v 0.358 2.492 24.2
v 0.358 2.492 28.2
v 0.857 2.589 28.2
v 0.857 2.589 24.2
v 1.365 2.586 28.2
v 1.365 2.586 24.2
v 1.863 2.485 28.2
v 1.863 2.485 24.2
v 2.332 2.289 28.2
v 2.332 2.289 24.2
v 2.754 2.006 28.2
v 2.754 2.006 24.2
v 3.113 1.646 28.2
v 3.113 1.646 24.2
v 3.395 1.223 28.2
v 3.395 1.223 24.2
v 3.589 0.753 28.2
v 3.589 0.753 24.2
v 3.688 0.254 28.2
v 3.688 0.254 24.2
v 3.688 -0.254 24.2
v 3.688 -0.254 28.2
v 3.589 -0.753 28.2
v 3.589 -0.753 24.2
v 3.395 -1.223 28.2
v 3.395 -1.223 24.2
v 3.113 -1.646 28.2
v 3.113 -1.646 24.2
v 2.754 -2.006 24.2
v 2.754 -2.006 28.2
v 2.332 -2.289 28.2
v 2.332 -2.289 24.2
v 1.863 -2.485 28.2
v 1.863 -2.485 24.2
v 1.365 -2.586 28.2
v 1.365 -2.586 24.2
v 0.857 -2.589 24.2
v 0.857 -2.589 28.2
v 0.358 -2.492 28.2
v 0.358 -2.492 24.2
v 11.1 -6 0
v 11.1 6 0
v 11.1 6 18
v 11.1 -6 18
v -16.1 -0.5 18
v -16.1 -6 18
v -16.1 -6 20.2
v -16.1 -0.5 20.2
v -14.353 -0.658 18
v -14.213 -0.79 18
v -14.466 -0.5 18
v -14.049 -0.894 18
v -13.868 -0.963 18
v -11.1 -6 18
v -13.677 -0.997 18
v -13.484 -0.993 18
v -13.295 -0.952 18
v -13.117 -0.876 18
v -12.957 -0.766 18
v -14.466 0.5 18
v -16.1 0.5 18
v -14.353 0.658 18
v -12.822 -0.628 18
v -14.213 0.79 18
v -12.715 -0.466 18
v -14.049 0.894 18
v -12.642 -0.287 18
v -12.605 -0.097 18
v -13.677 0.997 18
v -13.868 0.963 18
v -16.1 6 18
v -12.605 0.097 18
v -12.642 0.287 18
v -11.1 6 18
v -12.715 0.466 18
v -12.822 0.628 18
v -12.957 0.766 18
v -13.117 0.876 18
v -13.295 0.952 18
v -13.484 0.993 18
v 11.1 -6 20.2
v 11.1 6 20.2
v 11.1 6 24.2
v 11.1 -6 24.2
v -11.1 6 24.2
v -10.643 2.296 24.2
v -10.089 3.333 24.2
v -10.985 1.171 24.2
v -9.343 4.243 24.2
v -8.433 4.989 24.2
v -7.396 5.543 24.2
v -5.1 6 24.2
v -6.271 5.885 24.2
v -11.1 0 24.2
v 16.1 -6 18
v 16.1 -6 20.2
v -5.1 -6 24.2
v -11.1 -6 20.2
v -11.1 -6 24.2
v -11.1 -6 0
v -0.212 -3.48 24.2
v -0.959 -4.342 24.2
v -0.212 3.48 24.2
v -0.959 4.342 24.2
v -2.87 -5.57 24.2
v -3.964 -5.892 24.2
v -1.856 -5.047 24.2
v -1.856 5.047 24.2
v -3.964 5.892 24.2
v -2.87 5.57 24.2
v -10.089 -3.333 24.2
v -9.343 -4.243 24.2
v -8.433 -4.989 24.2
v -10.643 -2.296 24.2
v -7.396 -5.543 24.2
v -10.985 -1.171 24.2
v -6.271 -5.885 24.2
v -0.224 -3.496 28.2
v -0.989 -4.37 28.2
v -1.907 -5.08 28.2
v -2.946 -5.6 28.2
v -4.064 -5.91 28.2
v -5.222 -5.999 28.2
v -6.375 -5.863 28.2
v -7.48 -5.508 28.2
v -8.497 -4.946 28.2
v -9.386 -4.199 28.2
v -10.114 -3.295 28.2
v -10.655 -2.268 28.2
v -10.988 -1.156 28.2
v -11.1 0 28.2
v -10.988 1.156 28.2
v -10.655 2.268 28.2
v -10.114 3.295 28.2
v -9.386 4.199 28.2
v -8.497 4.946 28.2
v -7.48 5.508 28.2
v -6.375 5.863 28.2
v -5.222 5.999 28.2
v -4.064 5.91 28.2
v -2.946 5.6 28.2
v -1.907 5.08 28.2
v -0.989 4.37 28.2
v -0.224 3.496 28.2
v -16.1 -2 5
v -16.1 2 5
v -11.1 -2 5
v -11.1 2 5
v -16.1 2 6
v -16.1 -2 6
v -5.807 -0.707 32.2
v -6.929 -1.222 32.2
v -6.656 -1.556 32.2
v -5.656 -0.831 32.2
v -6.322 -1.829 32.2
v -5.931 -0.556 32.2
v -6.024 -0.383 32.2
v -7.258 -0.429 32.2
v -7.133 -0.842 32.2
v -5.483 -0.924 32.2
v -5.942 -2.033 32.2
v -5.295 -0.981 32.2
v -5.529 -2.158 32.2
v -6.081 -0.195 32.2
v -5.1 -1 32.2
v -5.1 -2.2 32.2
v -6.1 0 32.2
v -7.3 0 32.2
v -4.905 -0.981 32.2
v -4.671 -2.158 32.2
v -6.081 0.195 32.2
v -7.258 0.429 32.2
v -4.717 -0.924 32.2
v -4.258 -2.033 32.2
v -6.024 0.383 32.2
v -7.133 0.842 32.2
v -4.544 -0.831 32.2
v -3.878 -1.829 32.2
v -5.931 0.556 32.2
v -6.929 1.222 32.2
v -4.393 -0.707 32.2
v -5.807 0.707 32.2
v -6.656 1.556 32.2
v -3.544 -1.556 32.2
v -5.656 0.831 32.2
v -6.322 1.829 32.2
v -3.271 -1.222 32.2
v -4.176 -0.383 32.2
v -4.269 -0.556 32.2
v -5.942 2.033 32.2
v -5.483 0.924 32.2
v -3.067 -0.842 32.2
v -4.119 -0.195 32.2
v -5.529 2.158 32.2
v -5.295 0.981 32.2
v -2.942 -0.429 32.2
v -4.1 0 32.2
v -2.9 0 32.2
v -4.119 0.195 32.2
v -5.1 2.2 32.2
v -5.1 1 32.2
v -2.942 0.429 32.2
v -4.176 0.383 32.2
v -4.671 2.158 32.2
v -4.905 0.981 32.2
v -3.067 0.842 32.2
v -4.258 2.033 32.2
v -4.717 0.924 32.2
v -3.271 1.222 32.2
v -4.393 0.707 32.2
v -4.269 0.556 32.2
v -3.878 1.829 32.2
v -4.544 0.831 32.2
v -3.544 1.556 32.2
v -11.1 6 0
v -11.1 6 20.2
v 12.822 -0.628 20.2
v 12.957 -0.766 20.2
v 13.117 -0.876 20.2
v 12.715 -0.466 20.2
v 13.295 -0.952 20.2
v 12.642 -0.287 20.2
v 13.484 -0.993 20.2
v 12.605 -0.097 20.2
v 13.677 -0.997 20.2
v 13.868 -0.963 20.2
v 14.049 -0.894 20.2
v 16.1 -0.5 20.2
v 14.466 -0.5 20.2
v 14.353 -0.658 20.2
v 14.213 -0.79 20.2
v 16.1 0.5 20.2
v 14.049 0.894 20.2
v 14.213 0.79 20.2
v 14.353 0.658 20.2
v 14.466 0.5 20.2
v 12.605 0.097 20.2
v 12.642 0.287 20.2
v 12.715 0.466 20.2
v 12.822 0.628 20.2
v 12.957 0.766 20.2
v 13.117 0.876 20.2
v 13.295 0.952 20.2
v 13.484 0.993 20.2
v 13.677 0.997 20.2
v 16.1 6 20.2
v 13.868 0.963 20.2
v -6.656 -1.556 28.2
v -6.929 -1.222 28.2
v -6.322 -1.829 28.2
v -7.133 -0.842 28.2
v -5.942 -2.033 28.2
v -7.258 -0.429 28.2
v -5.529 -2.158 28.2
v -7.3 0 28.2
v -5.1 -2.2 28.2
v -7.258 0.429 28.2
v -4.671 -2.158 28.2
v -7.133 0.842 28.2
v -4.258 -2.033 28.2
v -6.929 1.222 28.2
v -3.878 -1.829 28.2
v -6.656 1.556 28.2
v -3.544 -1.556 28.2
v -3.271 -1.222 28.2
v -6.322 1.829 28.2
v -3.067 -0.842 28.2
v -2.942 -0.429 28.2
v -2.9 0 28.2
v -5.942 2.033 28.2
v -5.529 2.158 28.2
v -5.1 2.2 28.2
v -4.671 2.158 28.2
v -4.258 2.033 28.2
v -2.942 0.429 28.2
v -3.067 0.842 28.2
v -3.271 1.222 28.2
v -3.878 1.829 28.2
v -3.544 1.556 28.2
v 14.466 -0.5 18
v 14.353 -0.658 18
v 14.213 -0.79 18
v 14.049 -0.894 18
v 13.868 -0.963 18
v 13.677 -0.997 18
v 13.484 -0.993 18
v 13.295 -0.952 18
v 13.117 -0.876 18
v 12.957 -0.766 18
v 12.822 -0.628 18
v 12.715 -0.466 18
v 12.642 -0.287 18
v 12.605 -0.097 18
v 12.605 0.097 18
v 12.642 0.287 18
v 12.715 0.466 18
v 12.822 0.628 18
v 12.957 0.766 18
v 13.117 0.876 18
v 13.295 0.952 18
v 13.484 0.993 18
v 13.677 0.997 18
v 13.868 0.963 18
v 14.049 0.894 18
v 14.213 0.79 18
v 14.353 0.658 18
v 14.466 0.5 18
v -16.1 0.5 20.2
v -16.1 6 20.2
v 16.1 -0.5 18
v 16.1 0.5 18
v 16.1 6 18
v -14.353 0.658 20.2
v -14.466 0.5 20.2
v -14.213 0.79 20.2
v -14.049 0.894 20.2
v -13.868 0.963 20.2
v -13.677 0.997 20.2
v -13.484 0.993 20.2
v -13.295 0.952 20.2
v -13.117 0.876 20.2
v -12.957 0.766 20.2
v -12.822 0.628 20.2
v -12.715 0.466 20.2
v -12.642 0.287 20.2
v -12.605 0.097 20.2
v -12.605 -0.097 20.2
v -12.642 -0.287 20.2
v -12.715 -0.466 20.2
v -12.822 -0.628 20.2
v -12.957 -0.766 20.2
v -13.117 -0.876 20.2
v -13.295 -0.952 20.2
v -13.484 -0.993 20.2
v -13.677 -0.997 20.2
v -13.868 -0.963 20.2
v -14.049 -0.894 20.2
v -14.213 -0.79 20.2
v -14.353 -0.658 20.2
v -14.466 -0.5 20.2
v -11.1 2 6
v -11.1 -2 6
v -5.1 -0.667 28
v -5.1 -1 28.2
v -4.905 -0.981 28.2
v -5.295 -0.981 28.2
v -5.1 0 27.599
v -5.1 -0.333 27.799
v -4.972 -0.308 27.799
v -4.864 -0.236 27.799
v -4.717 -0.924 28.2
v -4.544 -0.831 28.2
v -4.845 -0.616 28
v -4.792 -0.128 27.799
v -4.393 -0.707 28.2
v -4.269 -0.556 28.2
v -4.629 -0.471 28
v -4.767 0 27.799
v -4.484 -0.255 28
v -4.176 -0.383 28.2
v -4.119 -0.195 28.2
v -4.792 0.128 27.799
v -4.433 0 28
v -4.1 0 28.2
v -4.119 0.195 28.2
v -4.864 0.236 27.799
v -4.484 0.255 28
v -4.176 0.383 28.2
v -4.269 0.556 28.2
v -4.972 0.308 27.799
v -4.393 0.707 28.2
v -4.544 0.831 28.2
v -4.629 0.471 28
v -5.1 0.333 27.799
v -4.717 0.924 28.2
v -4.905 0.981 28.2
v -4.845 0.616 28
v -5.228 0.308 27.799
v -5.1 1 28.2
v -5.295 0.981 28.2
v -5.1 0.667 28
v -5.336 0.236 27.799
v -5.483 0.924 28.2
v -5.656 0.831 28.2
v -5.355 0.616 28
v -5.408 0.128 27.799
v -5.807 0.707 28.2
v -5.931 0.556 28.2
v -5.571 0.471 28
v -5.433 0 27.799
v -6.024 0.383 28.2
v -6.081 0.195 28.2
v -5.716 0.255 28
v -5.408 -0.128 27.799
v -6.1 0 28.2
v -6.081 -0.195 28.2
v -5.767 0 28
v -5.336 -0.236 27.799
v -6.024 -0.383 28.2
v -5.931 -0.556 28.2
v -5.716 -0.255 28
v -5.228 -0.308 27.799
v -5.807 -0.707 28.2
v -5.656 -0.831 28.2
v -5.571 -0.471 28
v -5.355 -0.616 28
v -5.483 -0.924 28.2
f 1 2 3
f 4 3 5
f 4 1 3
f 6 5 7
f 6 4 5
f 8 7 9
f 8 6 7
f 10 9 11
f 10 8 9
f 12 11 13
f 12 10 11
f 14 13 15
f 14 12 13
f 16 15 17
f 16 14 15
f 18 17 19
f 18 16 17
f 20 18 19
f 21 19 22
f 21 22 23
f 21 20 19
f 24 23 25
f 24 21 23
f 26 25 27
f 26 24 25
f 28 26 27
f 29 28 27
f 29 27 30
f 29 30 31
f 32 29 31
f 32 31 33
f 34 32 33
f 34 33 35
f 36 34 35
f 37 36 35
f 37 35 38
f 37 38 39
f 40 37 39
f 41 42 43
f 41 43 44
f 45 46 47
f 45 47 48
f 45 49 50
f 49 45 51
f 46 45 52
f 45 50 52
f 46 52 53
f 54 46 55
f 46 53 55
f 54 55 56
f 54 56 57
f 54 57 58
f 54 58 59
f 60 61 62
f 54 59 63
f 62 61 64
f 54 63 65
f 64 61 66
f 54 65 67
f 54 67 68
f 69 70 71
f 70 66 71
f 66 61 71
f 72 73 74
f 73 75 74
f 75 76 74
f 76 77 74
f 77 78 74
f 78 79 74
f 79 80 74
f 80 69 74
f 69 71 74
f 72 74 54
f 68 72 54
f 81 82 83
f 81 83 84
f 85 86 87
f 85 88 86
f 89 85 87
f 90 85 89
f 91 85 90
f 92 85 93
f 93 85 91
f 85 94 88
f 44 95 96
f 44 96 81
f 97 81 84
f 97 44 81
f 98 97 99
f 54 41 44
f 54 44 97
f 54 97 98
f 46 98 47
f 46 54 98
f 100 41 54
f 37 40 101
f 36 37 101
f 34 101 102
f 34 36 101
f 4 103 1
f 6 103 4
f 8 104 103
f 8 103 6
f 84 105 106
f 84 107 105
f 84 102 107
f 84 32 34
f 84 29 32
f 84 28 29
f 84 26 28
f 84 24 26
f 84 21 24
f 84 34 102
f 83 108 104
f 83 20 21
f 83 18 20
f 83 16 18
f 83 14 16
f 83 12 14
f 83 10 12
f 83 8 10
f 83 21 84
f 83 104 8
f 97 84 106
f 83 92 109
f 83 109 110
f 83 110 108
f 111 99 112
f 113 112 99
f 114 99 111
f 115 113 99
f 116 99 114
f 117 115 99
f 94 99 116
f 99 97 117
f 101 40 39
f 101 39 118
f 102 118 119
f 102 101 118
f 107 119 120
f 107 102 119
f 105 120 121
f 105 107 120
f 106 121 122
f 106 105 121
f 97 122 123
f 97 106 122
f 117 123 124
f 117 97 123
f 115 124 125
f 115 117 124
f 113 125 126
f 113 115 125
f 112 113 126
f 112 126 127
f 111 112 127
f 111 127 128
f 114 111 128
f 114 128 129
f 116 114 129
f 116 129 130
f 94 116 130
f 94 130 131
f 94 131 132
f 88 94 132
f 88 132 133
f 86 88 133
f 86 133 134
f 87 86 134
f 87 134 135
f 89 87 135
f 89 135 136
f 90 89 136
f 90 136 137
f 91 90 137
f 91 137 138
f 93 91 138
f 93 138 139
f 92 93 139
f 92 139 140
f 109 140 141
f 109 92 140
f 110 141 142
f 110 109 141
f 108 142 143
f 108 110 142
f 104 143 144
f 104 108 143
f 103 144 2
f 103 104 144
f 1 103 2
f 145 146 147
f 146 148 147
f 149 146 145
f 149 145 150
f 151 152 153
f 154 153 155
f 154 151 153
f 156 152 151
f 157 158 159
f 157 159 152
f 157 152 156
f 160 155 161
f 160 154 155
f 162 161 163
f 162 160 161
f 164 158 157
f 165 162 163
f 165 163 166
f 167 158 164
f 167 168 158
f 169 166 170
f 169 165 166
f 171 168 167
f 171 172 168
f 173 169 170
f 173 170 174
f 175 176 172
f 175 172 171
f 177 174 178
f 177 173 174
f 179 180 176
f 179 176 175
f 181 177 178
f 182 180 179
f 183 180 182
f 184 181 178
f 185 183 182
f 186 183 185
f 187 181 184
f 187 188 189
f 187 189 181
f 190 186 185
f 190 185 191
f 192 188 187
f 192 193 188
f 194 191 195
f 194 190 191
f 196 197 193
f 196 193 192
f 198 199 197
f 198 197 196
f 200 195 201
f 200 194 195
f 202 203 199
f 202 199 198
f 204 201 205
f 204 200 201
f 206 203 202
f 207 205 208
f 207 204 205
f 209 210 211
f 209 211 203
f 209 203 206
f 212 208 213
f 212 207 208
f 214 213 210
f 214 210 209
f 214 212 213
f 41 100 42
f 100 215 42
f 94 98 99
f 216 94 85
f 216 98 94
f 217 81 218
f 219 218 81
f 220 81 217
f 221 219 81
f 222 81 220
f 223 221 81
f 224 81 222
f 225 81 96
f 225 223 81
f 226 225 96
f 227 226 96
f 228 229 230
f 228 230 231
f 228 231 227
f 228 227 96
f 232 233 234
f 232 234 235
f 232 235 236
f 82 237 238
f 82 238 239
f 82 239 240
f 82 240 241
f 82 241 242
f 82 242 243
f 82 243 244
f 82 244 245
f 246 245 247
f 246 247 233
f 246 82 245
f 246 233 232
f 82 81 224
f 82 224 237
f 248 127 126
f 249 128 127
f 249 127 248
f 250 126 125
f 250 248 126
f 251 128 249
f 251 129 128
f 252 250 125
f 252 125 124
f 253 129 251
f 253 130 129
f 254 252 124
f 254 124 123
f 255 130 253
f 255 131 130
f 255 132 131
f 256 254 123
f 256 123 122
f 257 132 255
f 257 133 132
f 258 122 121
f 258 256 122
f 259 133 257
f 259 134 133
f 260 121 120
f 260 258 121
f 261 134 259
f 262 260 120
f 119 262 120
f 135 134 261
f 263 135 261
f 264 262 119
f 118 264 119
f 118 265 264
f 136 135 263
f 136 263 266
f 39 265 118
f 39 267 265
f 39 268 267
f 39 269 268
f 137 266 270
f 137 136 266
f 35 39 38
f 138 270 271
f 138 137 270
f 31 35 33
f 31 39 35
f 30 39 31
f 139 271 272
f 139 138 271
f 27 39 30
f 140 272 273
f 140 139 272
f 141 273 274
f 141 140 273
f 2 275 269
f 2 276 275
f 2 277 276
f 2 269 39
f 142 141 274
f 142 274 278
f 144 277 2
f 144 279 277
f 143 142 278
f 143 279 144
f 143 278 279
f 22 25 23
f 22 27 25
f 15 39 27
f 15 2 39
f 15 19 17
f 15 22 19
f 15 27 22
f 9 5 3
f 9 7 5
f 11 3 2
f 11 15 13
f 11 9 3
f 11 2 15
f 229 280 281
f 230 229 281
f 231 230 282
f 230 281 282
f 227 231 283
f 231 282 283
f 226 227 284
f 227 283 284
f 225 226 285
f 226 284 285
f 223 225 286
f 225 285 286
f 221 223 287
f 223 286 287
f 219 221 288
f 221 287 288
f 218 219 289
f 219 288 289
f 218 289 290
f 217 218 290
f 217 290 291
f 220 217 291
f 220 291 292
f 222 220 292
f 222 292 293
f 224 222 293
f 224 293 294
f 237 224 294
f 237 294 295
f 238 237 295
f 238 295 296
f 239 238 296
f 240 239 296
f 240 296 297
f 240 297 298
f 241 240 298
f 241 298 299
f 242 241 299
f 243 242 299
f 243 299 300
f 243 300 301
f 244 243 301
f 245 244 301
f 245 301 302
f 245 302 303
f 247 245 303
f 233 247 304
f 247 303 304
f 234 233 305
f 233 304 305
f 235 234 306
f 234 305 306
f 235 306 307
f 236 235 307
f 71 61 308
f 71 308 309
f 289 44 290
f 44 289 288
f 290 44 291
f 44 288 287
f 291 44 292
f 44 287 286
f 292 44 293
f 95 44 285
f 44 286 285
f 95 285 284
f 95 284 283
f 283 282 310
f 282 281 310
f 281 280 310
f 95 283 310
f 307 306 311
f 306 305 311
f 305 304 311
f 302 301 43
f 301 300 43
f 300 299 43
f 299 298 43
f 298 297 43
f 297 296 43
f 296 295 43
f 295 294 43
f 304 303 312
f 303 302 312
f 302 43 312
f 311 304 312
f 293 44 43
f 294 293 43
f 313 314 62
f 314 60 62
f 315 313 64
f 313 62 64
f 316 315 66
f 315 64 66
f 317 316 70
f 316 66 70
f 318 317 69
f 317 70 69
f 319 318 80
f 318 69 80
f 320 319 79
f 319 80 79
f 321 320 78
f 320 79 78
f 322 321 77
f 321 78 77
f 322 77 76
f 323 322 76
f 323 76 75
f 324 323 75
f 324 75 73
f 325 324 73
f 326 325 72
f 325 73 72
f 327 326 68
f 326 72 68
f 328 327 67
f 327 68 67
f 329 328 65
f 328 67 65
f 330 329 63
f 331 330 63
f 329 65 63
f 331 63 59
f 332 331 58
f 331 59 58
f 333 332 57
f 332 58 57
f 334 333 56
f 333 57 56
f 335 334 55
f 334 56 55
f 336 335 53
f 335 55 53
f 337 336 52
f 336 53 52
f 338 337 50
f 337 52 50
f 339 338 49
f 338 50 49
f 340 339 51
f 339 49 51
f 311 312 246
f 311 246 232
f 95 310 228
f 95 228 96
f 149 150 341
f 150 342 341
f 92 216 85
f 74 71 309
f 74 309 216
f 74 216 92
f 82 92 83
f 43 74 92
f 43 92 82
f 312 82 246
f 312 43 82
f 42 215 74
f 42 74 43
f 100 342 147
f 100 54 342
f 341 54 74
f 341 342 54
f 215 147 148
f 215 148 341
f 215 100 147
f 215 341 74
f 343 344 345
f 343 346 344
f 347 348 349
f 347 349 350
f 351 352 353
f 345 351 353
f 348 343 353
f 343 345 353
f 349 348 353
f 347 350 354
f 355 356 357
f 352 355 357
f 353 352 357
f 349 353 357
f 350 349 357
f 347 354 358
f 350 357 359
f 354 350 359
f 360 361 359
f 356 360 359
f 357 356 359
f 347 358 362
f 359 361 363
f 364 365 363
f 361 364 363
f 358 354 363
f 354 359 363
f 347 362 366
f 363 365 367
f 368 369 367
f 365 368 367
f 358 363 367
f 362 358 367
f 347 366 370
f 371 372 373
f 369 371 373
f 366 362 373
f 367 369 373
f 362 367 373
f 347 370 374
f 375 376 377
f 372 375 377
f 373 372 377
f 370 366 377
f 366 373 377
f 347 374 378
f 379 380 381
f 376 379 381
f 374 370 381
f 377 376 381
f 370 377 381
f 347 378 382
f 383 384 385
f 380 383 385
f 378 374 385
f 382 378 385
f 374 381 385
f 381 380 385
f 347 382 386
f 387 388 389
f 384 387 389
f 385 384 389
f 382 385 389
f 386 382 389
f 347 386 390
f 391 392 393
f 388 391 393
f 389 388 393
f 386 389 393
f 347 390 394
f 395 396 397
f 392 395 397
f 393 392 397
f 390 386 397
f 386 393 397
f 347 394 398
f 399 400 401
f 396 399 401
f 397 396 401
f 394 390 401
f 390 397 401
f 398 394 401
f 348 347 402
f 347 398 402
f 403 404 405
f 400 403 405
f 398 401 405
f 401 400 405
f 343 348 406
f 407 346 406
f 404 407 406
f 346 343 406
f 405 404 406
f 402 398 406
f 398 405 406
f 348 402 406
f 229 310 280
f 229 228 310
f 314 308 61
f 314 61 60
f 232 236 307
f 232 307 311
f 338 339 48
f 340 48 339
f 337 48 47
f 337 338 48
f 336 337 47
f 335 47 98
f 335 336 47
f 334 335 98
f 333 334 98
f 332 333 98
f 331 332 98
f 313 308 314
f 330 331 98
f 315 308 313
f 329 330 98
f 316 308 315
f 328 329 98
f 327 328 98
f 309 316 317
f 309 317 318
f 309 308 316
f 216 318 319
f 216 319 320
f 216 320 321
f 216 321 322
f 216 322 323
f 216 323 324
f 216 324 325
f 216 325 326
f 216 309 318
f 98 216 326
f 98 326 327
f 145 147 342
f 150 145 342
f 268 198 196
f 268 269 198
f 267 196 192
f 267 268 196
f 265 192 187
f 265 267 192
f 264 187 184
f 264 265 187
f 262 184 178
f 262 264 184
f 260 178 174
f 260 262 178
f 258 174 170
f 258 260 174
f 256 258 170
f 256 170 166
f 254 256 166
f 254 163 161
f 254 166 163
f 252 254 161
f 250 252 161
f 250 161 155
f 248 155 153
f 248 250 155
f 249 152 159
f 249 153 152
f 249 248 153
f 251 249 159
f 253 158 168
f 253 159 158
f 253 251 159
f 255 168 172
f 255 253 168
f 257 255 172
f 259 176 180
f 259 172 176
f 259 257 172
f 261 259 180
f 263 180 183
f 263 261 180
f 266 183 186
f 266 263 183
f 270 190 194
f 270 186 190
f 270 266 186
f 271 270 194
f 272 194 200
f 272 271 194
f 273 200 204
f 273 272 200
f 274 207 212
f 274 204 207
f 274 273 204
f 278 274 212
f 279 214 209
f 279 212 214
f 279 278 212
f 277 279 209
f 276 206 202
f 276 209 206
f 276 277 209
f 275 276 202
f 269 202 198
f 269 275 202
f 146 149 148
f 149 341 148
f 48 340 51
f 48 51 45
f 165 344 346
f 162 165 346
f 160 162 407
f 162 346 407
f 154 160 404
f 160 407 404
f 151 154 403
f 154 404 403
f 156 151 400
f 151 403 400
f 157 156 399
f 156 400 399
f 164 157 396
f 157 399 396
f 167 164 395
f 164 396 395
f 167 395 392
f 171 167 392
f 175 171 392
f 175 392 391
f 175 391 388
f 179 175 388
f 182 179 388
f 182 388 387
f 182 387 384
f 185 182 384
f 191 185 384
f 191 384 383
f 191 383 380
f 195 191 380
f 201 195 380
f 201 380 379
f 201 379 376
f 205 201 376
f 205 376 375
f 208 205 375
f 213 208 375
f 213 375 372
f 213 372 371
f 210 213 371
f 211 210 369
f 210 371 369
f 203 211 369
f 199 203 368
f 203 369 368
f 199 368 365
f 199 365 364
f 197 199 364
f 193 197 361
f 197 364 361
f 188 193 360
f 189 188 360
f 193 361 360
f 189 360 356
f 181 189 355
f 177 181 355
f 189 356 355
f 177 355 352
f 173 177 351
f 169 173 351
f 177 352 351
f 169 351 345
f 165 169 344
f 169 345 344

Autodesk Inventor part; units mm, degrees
ref_plane "YZ Plane" through (0, 0, 0) normal (1, 0, 0) x (0, 1, 0)
ref_plane "XZ Plane" through (0, 0, 0) normal (0, 1, 0) x (-1, 0, 0)
ref_plane "XY Plane" through (0, 0, 0) normal (0, 0, 1) x (1, 0, 0)
sketch "Sketch1" plane through (0, 0, 0) normal (0, 0, 1) x (1, 0, 0)
  line L0 (-11.1, 6) -> (11.1, 6)
  line L1 (11.1, 6) -> (11.1, -6)
  line L2 (11.1, -6) -> (-11.1, -6)
  line L3 (-11.1, -6) -> (-11.1, 6)
  point P0 (0, 0)
  dimension "d0" = 22.2
  dimension "d1" = 12
  dimension "d2" = 6
  dimension "d3" = 11.1
extrude "Extrusion1" add sketch "Sketch1" along normal blind 18
sketch "Sketch2" plane through (0, 0, 18) normal (0, 0, 1) x (1, 0, 0)
  line L0 (-16.1, 6) -> (16.1, 6)
  line L1 (16.1, 6) -> (16.1, -6)
  line L2 (16.1, -6) -> (-16.1, -6)
  line L3 (-16.1, -6) -> (-16.1, 6)
  line L4 (11.1, 6) -> (-11.1, 6) projected
  line L5 (-11.1, -6) -> (11.1, -6) projected
  line L6 (-11.1, 6) -> (-11.1, -6) projected
  line L7 (11.1, -6) -> (11.1, 6) projected
  point P0 (0, 0)
  dimension "d6" = 5
  dimension "d7" = 5
extrude "Extrusion2" add sketch "Sketch2" along normal blind 2.2
sketch "Sketch3" plane through (0, 0, 20.2) normal (0, 0, 1) x (1, 0, 0)
  line L0 (16.1, 6) -> (-16.1, 6) projected
  line L1 (-16.1, -6) -> (16.1, -6) projected
  line L2 (-11.1, 6) -> (11.1, 6)
  line L3 (11.1, 6) -> (11.1, -6)
  line L4 (11.1, -6) -> (-11.1, -6)
  line L5 (-11.1, -6) -> (-11.1, 6)
  line L6 (-16.1, 6) -> (-16.1, -6) projected
  line L7 (16.1, -6) -> (16.1, 6) projected
  point P0 (0, 0)
  point P1 (-11.1, -6)
  dimension "d10" = 5
  dimension "d11" = 5
extrude "Extrusion3" add sketch "Sketch3" along normal blind 4 contours L3 L1 L5 L0
sketch "Sketch4" plane through (0, 0, 24.2) normal (0, 0, 1) x (1, 0, 0)
  circle A0 centre (-5.1, 0) radius 6
  line L0 (11.1, 6) -> (-11.1, 6) projected
  line L1 (-11.1, 6) -> (-11.1, -6) projected
  point P0 (0, 0)
  dimension "d14" = 6
extrude "Extrusion4" add sketch "Sketch4" along normal blind 4 contours A0
sketch "Sketch5" plane through (0, 0, 24.2) normal (0, 0, 1) x (1, 0, 0)
  circle A0 centre (1.1, 0) radius 2.6
  line L0 (11.1, -6) -> (11.1, 6) projected
  point P0 (0, 0)
  dimension "d17" = 5.2
  dimension "d18" = 10
extrude "Extrusion5" add sketch "Sketch5" along normal blind 4
sketch "Sketch6" plane through (0, 0, 28.2) normal (0, 0, 1) x (1, 0, 0)
  arc A0 (0.3581, 2.4919) -> (0.3581, -2.4919) centre (-5.1, 0) ccw projected
  circle A1 centre (-5.1, 0) radius 2.2
  point P0 (0, 0)
  dimension "d21" = 4.4
extrude "Extrusion6" add sketch "Sketch6" along normal blind 4
sketch "Sketch7" plane through (-5.1, 0, 32.2) normal (0, 0, 1) x (1, 0, 0)
  point P0 (5.1, 0)
  point P1 (0, 0)
hole "Hole1" at (-5.1, 0, 32.2) direction (0, 0, -1) diameter 2 depth 4 tip angle 118
sketch "Sketch8" plane through (0, 0, 20.2) normal (0, 0, 1) x (1, 0, 0)
  line L0 (-16.1, 6) -> (-16.1, -6) projected
  line L1 (16.1, -6) -> (16.1, 6) projected
  point P0 (0, 0)
  point P1 (-13.6, 0)
  point P2 (13.6, 0)
  dimension "d31" = 2.5
  dimension "d32" = 2.5
hole "Hole2" at (-13.6, 0, 20.2) at (13.6, 0, 20.2) direction (0, 0, -1) diameter 2 depth 4 tip angle 118
sketch "Sketch9" plane through (0, 0, 20.2) normal (0, 0, 1) x (1, 0, 0)
  line L0 (-16.1, 6) -> (-16.1, -6) projected
  line L1 (-16.1, 0.5) -> (-14.0089, 0.5)
  line L2 (-14.0089, 0.5) -> (-14.0089, -0.5)
  line L3 (-14.0089, -0.5) -> (-16.1, -0.5)
  line L4 (-16.1, -0.5) -> (-16.1, 0.5)
  circle A0 centre (-13.6, 0) radius 1 projected
  line L5 (16.1, -6) -> (16.1, 6) projected
  line L6 (13.947, 0.5) -> (16.1, 0.5)
  line L7 (16.1, 0.5) -> (16.1, -0.5)
  line L8 (16.1, -0.5) -> (13.947, -0.5)
  line L9 (13.947, -0.5) -> (13.947, 0.5)
  circle A1 centre (13.6, 0) radius 1 projected
  point P0 (0, 0)
  point P1 (-14.466, -0.5)
  point P2 (-14.466, 0.5)
  dimension "d40" = 1
  dimension "d41" = 0.5
  dimension "d42" = 1
  dimension "d43" = 0.5
extrude "Extrusion7" cut sketch "Sketch9" against normal blind 4 contours L1 A0 L3 L0 | L8 A1 L6 L5 | L8 L9 L6 A1 picked at (14.1647, 0)
sketch "Sketch10" plane through (-11.1, -6, 0) normal (-1, 0, 0) x (0, 0, 1)
  line L0 (6, 8) -> (5, 8)
  line L1 (5, 8) -> (5, 4)
  line L2 (5, 4) -> (6, 4)
  line L3 (6, 4) -> (6, 8)
  line L4 (0, 12) -> (0, 0) projected
  line L5 (0, 0) -> (18, 0) projected
  line L6 (0, 12) -> (18, 12) projected
  point P0 (0, 6)
  dimension "d46" = 1
  dimension "d47" = 5
  dimension "d48" = 4
  dimension "d49" = 4
extrude "Extrusion8" add sketch "Sketch10" along normal blind 5
properties part number "mg90s-servo"
